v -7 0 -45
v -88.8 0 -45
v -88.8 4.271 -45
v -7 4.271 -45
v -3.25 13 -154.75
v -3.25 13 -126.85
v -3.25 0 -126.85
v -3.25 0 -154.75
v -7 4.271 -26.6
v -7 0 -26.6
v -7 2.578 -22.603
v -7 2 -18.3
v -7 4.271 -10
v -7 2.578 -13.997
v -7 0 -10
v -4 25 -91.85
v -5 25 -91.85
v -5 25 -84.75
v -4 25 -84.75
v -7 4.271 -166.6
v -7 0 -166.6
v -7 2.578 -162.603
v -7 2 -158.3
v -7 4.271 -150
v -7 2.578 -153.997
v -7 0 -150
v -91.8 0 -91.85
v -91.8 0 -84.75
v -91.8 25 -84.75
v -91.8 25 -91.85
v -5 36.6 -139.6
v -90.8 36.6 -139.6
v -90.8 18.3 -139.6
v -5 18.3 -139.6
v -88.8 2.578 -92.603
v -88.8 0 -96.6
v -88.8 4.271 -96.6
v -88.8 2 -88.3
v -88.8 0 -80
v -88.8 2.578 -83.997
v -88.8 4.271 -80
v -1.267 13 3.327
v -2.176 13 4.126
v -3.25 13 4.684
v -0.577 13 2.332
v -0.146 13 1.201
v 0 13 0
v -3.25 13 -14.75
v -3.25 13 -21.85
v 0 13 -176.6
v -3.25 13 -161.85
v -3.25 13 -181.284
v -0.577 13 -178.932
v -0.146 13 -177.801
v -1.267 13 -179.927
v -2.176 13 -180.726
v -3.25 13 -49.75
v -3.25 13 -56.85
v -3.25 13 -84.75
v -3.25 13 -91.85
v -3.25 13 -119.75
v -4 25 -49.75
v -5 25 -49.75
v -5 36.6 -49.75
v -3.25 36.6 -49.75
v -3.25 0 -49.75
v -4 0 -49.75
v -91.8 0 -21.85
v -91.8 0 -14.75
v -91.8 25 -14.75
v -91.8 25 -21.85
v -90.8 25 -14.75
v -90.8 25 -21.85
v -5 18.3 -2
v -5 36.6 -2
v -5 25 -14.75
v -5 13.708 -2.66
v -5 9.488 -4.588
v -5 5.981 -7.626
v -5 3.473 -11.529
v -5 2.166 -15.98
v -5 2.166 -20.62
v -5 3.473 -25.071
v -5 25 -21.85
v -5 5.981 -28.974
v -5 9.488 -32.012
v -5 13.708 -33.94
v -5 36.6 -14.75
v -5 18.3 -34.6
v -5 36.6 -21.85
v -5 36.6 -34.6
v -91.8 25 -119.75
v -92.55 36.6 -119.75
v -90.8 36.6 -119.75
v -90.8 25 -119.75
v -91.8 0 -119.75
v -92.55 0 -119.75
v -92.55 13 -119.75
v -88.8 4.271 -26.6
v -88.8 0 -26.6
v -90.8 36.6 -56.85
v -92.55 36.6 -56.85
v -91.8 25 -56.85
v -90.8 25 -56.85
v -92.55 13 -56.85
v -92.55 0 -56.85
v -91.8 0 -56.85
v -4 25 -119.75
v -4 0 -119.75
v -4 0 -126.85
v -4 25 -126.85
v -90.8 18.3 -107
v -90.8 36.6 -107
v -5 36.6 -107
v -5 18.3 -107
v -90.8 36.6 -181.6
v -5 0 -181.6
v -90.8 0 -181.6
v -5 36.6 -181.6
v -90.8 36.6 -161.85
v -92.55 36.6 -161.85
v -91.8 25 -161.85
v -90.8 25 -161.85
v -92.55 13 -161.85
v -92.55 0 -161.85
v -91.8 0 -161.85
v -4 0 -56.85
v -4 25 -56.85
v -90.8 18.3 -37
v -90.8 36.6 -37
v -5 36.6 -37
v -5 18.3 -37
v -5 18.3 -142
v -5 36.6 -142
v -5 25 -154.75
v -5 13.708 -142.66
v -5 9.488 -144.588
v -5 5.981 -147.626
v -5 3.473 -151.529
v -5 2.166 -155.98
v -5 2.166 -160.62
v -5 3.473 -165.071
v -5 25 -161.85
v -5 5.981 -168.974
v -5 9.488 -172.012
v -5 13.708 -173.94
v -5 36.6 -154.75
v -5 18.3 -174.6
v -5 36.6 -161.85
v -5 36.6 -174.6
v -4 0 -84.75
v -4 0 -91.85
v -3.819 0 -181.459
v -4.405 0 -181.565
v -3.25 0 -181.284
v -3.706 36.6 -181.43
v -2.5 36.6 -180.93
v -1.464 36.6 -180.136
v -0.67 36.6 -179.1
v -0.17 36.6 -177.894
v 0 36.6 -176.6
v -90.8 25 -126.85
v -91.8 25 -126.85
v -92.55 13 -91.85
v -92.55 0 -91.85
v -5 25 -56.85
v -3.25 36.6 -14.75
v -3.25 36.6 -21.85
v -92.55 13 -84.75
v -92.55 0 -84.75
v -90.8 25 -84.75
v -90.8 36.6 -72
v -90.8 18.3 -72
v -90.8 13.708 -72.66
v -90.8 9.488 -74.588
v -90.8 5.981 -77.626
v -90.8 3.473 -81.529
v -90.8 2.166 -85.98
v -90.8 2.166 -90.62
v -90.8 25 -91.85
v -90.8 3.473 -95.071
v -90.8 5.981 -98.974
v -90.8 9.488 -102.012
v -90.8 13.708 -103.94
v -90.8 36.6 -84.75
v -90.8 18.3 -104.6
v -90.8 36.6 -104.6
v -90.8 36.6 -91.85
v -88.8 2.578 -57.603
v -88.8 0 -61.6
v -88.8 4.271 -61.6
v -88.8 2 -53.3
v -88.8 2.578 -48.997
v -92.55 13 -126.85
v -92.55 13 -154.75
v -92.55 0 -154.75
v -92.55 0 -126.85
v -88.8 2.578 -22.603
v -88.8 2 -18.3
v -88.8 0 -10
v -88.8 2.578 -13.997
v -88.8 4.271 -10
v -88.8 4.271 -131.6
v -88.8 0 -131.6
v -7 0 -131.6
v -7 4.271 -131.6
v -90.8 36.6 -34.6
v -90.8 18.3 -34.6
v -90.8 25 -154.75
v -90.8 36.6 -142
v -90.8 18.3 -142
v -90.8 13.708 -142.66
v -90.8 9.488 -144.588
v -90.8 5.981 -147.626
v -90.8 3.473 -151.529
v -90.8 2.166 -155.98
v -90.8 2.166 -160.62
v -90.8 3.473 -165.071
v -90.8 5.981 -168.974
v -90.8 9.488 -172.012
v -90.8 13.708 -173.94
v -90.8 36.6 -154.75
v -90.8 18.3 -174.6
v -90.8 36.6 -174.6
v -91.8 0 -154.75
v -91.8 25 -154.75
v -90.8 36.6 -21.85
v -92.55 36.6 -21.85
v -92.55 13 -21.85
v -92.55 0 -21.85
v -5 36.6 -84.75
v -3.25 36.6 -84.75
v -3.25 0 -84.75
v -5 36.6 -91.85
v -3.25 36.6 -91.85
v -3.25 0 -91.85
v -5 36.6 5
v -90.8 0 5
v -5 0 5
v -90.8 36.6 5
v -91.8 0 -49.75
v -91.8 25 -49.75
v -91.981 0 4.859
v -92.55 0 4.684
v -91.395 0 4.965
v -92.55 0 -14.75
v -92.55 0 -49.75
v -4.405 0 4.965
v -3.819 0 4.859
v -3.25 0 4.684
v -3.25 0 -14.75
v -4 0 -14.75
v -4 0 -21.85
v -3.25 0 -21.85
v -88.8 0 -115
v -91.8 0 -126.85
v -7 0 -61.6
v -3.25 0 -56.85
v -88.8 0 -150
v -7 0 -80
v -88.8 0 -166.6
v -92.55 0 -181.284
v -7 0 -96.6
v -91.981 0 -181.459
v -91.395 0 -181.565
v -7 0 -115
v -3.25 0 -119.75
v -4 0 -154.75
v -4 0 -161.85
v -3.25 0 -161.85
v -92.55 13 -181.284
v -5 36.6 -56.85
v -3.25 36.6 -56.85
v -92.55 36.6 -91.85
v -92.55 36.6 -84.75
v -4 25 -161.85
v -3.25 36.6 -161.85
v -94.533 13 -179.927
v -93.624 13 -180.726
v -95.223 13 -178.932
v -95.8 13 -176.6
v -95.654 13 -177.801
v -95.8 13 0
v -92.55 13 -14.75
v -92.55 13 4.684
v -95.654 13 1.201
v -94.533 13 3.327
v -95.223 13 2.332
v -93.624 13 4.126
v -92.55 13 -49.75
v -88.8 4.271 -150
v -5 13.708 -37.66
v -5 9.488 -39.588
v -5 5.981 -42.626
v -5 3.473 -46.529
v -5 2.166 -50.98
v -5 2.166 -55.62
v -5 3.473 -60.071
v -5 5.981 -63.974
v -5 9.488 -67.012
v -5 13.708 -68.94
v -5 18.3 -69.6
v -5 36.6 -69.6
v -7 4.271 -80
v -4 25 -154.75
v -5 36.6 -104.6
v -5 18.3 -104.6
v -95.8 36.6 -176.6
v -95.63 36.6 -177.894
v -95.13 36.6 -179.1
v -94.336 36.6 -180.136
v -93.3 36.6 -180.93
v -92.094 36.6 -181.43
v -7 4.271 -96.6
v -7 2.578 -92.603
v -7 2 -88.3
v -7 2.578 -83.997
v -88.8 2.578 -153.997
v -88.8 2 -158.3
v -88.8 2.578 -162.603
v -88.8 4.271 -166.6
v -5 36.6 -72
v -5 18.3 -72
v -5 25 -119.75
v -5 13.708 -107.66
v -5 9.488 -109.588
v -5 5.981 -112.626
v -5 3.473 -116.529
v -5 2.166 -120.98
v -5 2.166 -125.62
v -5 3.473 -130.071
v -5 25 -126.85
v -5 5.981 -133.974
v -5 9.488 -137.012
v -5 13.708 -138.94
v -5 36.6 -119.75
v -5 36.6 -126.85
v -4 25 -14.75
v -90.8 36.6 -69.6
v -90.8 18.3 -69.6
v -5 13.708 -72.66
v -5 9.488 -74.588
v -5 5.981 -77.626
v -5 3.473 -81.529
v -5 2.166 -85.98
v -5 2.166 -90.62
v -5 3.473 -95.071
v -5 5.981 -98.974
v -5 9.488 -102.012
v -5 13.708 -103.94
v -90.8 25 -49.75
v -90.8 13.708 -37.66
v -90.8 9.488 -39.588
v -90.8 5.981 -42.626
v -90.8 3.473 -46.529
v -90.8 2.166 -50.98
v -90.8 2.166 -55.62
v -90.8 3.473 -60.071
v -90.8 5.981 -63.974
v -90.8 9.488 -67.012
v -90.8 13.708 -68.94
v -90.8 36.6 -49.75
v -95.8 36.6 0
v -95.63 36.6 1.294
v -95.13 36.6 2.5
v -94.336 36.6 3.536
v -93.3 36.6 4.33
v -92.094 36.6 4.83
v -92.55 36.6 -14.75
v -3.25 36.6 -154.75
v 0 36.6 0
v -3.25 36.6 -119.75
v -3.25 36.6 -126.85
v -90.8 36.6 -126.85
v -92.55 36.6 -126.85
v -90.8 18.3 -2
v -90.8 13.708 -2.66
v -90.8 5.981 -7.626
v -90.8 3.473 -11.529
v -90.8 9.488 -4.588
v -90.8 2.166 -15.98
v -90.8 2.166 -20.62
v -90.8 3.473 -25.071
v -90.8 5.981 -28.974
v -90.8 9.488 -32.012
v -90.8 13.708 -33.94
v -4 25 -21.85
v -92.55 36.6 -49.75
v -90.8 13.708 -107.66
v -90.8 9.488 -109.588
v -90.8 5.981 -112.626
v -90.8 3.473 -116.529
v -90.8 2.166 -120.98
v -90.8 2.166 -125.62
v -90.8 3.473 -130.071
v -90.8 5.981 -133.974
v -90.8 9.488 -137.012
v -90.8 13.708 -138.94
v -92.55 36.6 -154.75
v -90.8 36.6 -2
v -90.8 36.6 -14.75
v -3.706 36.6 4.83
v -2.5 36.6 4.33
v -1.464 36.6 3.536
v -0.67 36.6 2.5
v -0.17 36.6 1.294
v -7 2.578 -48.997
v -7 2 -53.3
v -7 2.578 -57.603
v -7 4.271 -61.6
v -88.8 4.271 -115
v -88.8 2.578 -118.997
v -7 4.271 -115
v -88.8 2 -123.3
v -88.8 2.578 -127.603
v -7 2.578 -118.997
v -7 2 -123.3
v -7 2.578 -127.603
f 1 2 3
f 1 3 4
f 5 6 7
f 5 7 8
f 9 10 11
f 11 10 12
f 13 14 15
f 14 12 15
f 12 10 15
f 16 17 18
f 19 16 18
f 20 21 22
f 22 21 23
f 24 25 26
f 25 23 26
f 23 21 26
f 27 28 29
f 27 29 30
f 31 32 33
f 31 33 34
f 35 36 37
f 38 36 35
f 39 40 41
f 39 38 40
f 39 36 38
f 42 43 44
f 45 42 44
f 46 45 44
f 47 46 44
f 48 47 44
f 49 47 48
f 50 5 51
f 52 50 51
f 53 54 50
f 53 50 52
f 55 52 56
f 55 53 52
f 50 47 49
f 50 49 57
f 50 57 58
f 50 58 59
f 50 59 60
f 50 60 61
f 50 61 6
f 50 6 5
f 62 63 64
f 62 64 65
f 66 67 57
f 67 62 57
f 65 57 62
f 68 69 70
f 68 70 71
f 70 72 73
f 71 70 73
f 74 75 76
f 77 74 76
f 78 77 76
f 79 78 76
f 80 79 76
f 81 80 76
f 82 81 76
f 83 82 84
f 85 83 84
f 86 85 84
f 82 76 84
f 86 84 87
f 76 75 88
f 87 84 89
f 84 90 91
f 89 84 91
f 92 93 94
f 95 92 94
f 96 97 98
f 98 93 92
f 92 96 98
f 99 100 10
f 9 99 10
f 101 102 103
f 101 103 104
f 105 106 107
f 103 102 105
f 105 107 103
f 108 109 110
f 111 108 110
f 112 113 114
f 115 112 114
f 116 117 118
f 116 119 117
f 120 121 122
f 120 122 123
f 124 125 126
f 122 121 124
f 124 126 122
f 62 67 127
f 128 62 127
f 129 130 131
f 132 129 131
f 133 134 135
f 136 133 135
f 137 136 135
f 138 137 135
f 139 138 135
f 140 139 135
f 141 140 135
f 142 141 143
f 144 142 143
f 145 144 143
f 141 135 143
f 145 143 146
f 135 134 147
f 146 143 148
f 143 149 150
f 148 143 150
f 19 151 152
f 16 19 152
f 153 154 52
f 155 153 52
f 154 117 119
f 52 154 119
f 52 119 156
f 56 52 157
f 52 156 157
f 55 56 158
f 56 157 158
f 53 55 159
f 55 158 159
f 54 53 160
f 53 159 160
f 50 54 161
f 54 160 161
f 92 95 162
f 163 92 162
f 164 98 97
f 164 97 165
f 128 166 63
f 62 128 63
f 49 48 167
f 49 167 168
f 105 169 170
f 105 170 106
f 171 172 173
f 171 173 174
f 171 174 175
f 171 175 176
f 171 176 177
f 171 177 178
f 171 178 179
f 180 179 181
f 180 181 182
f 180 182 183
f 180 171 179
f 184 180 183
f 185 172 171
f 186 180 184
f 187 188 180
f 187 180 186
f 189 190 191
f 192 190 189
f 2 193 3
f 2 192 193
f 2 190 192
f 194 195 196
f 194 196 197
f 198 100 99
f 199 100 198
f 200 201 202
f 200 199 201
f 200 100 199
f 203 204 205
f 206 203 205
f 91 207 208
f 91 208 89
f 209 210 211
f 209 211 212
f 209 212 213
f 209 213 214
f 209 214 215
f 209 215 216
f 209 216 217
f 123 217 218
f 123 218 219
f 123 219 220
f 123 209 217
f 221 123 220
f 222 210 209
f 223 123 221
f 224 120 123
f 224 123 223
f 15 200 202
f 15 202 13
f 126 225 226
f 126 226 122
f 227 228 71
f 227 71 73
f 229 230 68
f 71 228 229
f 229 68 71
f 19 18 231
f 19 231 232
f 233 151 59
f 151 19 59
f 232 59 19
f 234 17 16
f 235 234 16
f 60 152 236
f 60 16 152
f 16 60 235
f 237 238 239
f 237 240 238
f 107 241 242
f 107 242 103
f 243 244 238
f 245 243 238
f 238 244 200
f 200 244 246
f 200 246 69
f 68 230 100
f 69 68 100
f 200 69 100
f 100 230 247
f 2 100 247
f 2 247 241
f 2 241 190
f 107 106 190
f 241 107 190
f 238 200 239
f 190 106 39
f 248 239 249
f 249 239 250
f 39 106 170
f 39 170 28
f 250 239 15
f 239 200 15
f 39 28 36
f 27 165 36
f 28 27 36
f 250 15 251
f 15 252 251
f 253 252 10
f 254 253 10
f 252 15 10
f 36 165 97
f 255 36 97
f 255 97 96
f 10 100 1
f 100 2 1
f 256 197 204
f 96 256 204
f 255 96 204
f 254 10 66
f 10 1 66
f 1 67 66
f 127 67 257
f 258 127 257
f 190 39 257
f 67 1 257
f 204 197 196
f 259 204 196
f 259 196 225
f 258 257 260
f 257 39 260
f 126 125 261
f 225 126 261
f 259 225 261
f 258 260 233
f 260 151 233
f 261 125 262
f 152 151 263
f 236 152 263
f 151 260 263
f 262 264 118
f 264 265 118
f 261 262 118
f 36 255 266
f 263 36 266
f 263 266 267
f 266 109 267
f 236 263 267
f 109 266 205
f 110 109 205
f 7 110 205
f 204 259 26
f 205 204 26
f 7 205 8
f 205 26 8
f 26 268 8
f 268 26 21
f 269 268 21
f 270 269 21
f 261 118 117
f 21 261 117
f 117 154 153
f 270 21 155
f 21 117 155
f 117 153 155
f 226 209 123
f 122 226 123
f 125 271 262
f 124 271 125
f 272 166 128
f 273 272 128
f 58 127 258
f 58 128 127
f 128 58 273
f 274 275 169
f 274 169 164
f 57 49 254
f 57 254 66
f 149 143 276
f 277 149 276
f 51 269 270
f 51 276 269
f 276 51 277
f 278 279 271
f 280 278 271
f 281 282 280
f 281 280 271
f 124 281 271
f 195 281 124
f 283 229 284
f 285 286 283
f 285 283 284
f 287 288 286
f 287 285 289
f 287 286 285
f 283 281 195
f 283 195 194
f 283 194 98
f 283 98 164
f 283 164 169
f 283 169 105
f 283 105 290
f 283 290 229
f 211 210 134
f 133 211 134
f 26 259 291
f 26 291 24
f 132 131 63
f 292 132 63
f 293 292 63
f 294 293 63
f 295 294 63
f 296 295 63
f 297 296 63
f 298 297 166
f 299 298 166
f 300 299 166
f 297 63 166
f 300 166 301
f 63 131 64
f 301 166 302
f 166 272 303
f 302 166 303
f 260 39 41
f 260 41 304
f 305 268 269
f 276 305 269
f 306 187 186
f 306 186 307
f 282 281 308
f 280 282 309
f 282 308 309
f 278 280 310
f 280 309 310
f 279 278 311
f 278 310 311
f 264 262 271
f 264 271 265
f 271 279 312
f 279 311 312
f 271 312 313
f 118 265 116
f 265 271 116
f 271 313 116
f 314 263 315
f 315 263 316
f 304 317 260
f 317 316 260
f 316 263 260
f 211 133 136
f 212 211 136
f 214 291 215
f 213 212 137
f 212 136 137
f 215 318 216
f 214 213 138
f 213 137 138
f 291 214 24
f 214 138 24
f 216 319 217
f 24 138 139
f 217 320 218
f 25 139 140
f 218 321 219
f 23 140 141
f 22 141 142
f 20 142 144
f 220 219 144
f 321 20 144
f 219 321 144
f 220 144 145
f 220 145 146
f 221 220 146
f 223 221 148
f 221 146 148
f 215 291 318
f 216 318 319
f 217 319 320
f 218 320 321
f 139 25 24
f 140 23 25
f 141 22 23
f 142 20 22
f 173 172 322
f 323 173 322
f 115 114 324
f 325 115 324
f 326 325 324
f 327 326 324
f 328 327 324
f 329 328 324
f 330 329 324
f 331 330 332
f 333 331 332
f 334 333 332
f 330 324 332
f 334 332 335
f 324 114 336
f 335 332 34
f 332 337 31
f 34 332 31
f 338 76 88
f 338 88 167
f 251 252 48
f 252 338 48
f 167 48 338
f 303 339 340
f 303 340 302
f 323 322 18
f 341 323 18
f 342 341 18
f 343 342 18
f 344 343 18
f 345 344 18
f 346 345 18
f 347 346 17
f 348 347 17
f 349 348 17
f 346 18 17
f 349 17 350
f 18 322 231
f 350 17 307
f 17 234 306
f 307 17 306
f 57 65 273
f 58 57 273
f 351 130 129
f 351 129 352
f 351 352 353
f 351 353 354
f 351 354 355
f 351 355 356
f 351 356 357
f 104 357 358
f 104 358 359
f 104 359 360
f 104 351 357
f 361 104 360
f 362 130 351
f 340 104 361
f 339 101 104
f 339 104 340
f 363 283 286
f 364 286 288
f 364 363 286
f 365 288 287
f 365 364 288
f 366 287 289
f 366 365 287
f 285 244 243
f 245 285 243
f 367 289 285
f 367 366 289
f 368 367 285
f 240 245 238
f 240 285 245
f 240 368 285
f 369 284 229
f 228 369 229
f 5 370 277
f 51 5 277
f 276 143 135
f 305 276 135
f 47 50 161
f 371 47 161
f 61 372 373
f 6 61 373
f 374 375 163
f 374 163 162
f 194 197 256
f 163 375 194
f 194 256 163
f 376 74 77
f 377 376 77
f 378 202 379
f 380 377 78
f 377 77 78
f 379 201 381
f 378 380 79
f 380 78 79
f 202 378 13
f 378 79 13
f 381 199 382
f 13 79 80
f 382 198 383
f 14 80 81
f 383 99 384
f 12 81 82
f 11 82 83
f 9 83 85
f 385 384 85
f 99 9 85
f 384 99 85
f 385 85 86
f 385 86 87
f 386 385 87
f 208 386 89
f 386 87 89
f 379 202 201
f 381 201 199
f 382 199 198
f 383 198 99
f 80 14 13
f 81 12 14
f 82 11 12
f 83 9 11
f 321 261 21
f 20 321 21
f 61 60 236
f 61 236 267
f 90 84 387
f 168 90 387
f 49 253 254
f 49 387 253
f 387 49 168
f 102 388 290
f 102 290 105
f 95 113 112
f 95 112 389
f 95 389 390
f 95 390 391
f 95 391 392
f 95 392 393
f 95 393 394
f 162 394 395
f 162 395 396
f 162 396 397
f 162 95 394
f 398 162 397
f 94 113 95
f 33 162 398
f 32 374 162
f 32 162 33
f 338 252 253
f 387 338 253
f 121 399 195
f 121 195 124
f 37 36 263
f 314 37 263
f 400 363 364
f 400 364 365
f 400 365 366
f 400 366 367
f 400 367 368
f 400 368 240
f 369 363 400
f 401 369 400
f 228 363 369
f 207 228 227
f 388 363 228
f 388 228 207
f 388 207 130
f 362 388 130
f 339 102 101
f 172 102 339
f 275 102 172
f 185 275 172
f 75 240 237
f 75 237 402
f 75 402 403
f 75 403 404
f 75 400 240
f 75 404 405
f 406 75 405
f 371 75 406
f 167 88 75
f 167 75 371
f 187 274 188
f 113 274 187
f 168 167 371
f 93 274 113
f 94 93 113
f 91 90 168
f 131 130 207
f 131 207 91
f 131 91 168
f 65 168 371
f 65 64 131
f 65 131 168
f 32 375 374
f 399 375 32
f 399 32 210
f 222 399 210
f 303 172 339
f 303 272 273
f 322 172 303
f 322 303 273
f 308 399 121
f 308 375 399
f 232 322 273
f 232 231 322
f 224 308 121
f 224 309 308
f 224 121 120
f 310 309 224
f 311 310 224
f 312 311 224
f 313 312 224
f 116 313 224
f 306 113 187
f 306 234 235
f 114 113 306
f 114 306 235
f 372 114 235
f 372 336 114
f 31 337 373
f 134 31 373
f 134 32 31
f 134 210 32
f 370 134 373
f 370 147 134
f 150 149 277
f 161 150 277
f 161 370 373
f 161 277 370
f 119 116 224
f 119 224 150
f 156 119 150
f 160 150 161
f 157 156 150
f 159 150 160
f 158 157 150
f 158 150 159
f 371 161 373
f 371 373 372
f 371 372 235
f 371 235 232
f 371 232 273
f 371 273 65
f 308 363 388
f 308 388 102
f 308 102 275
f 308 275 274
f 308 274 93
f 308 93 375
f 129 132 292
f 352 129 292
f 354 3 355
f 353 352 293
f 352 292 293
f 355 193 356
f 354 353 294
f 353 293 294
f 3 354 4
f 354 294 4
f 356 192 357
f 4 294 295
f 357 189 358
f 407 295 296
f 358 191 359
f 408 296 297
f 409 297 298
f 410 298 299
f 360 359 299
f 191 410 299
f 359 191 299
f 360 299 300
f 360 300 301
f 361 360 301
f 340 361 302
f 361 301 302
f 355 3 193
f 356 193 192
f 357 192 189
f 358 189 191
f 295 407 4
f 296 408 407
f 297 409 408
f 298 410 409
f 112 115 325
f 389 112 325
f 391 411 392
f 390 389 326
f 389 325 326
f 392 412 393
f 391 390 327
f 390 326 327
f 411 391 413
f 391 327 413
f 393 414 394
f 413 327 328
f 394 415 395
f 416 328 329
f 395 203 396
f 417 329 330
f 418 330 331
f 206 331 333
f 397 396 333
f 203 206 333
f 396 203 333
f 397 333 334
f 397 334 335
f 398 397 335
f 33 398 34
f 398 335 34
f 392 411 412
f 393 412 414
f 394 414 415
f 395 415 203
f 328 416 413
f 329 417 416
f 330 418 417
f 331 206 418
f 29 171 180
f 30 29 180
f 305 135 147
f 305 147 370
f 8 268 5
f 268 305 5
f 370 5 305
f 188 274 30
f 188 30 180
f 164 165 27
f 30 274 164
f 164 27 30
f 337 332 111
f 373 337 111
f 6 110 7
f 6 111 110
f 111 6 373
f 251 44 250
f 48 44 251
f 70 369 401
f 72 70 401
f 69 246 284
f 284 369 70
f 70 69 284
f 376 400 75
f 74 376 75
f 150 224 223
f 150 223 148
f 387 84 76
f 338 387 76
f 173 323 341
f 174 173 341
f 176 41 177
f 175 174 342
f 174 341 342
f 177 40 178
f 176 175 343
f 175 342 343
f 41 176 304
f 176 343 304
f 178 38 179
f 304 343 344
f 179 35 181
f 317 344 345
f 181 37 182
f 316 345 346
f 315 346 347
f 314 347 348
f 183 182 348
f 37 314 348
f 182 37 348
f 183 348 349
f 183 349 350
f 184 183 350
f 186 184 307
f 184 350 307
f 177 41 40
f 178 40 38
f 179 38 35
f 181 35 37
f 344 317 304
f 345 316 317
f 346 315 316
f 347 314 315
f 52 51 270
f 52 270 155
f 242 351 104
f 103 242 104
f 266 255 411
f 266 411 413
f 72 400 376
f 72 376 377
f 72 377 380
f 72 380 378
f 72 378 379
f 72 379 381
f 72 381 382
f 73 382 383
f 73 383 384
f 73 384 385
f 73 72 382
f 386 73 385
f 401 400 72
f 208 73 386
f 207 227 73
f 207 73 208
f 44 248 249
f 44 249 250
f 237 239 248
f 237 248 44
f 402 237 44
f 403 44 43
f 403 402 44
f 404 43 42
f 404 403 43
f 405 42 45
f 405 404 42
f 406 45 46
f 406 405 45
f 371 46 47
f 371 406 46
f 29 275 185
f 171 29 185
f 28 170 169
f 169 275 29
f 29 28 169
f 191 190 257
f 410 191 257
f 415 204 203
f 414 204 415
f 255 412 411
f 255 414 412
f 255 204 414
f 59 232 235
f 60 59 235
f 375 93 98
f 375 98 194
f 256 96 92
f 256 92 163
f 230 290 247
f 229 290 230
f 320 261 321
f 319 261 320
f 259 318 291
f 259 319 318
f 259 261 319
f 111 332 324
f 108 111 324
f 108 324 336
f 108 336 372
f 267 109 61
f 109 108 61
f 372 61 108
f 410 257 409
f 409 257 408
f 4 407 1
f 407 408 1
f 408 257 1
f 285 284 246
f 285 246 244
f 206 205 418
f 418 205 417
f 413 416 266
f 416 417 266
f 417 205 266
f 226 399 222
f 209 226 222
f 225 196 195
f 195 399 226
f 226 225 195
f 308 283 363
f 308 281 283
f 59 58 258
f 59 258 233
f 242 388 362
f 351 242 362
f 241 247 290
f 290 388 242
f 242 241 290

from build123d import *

# Parameters (mm, degrees)
SKETCH_241_W                = 95.8
SKETCH_241_H                = 36.6
EXTRUDE_326_DEPTH           = 36.6
CUT_EXTRUDE_START           = -5
SKETCH_380_R                = 16.3
CUT_EXTRUDE_539_DEPTH       = 85.8
SKETCH_588_W                = 85.8
SKETCH_588_H                = 32.6
CUT_EXTRUDE_850_DEPTH       = 18.3
CUT_EXTRUDE_1245_DEPTH      = 109.888750567
CUT_EXTRUDE_1245_DEPTH_BACK = 109.888750567
SKETCH_902_W                = 0.75
SKETCH_902_H                = 7.1
SKETCH_A_W                  = 7.1
SKETCH_A_H                  = 11.6
CUT_EXTRUDE_A_DEPTH         = 1
SKETCH_B_W                  = 7.1
SKETCH_B_H                  = 11.6
CUT_EXTRUDE_B_DEPTH         = 1
SKETCH_1779_W               = 81.8
SKETCH_1779_H               = 16.6
CUT_EXTRUDE_2059_DEPTH      = 109.888750567
SKETCH_2105_W               = 3.25
SKETCH_2105_H               = 13.1
CUT_EXTRUDE_2527_DEPTH      = 13
PATTERN_LINEAR_2584_COUNT   = 5
PATTERN_LINEAR_2584_PITCH   = 35
SKETCH_2694_W               = 95.8
SKETCH_2694_H               = 36.6
EXTRUDE_2884_DEPTH          = 5
SKETCH_2964_W               = 95.8
SKETCH_2964_H               = 36.6
EXTRUDE_3079_DEPTH          = 5
FILLET_1_R                  = 5
FILLET_2_R                  = 5
FILLET_3_R                  = 5
FILLET_4_R                  = 5
SKETCH_3561_W               = 186.6
SKETCH_3561_H               = 13
CUT_EXTRUDE_3822_DEPTH      = 3.25
SKETCH_4173_W               = 186.6
SKETCH_4173_H               = 13
CUT_EXTRUDE_4352_DEPTH      = 3.25


with BuildPart() as part:
    # Sketch 241 → Extrude 326 (new body)
    with BuildSketch(Plane(origin=(0, 0, 0), x_dir=(1, 0, 0), z_dir=(0, 1, 0))):
        with Locations((-47.9, 18.3)):
            Rectangle(SKETCH_241_W, SKETCH_241_H)
    extrude(amount=EXTRUDE_326_DEPTH)

    # Sketch 380 → Cut-Extrude 539 (cut)
    with BuildSketch(Plane(origin=(0, 0, 0), x_dir=(0, 0, -1), z_dir=(1, 0, 0)).offset(CUT_EXTRUDE_START)):
        with Locations((18.3, 18.3)):
            Circle(SKETCH_380_R)
    extrude(amount=-CUT_EXTRUDE_539_DEPTH, mode=Mode.SUBTRACT)

    # Sketch 588 → Cut-Extrude 850 (cut)
    with BuildSketch(Plane(origin=(0, 36.6, 0), x_dir=(1, 0, 0), z_dir=(0, 1, 0))):
        with Locations((-47.9, 18.3)):
            Rectangle(SKETCH_588_W, SKETCH_588_H)
    extrude(amount=-CUT_EXTRUDE_850_DEPTH, mode=Mode.SUBTRACT)

    # Sketch 902 → Cut-Extrude 1245 (cut, two sides: drawn at the far end of the back side and taken through both)
    with BuildSketch(Plane(origin=(0, 36.6, 0), x_dir=(1, 0, 0), z_dir=(0, 1, 0)).offset(-CUT_EXTRUDE_1245_DEPTH_BACK)):
        with Locations((-92.175, 18.3)):
            Rectangle(SKETCH_902_W, SKETCH_902_H)
        with Locations((-3.625, 18.3)):
            Rectangle(SKETCH_902_W, SKETCH_902_H)
    extrude(amount=CUT_EXTRUDE_1245_DEPTH + CUT_EXTRUDE_1245_DEPTH_BACK, mode=Mode.SUBTRACT)

    # 触点开窗面A → 触点开窗A (cut)
    with BuildSketch(Plane(origin=(-90.8, 0, 0), x_dir=(0, 0, -1), z_dir=(1, 0, 0))):
        with Locations((18.3, 30.8)):
            Rectangle(SKETCH_A_W, SKETCH_A_H)
    extrude(amount=-CUT_EXTRUDE_A_DEPTH, mode=Mode.SUBTRACT)

    # 触点开窗面B → 触点开窗B (cut)
    with BuildSketch(Plane.ZY.offset(5)):
        with Locations((-18.3, 30.8)):
            Rectangle(SKETCH_B_W, SKETCH_B_H)
    extrude(amount=-CUT_EXTRUDE_B_DEPTH, mode=Mode.SUBTRACT)

    # Sketch 1779 → Cut-Extrude 2059 (cut, through all)
    with BuildSketch(Plane.XZ):
        with Locations((-47.9, -18.3)):
            Rectangle(SKETCH_1779_W, SKETCH_1779_H)
    extrude(amount=-CUT_EXTRUDE_2059_DEPTH, mode=Mode.SUBTRACT)

    # Sketch 2105 → Cut-Extrude 2527 (cut)
    with BuildSketch(Plane.XZ):
        with Locations((-94.175, -18.3)):
            Rectangle(SKETCH_2105_W, SKETCH_2105_H)
        with Locations((-1.625, -18.3)):
            Rectangle(SKETCH_2105_W, SKETCH_2105_H)
    extrude(amount=-CUT_EXTRUDE_2527_DEPTH, mode=Mode.SUBTRACT)


with BuildPart() as pattern_linear_2584_1:
    # Pattern Linear 2584: pattern copy
    add(part.part.moved(Location(Vector(0, 0, -1) * (1 * PATTERN_LINEAR_2584_PITCH))))


with BuildPart() as pattern_linear_2584_2:
    # Pattern Linear 2584: pattern copy
    add(part.part.moved(Location(Vector(0, 0, -1) * (2 * PATTERN_LINEAR_2584_PITCH))))


with BuildPart() as pattern_linear_2584_3:
    # Pattern Linear 2584: pattern copy
    add(part.part.moved(Location(Vector(0, 0, -1) * (3 * PATTERN_LINEAR_2584_PITCH))))


with BuildPart() as pattern_linear_2584_4:
    # Pattern Linear 2584: pattern copy
    add(part.part.moved(Location(Vector(0, 0, -1) * (4 * PATTERN_LINEAR_2584_PITCH))))

    # Sketch 2694 → Extrude 2884 (add)
    with BuildSketch(Plane(origin=(0, 0, -176.6), x_dir=(-1, 0, 0), z_dir=(0, 0, -1))):
        with Locations((47.9, 18.3)):
            Rectangle(SKETCH_2694_W, SKETCH_2694_H)
    extrude(amount=EXTRUDE_2884_DEPTH)

    # 圆角3
    fillet_3_edges = [pattern_linear_2584_4.edges().sort_by_distance(p)[0] for p in [
        (-95.8, 18.3, -181.6),
    ]]
    fillet(fillet_3_edges, radius=FILLET_3_R)

    # 圆角4
    fillet_4_edges = [pattern_linear_2584_4.edges().sort_by_distance(p)[0] for p in [
        (0, 18.3, -181.6),
    ]]
    fillet(fillet_4_edges, radius=FILLET_4_R)


with BuildPart() as part_1:
    add(part.part)

    # Sketch 2964 → Extrude 3079 (add)
    with BuildSketch(Plane.XY):
        with Locations((-47.9, 18.3)):
            Rectangle(SKETCH_2964_W, SKETCH_2964_H)
    extrude(amount=EXTRUDE_3079_DEPTH)

    # 圆角1
    fillet_1_edges = [part_1.edges().sort_by_distance(p)[0] for p in [
        (-95.8, 18.3, 5),
    ]]
    fillet(fillet_1_edges, radius=FILLET_1_R)

    # 圆角2
    fillet_2_edges = [part_1.edges().sort_by_distance(p)[0] for p in [
        (0, 18.3, 5),
    ]]
    fillet(fillet_2_edges, radius=FILLET_2_R)


with BuildPart() as cut_extrude_3822_tool:
    # Sketch 3561 → Cut-Extrude 3822 (new body)
    with BuildSketch(Plane.ZY.offset(95.8)):
        with Locations((-88.3, 6.5)):
            Rectangle(SKETCH_3561_W, SKETCH_3561_H)
    extrude(amount=-CUT_EXTRUDE_3822_DEPTH)


with BuildPart() as part_2:
    add(part_1.part)

    # Cut-Extrude 3822: cut by cut_extrude_3822_tool
    add(cut_extrude_3822_tool.part, mode=Mode.SUBTRACT)


with BuildPart() as pattern_linear_2584_1_1:
    add(pattern_linear_2584_1.part)

    # Cut-Extrude 3822: cut by cut_extrude_3822_tool
    add(cut_extrude_3822_tool.part, mode=Mode.SUBTRACT)


with BuildPart() as pattern_linear_2584_2_1:
    add(pattern_linear_2584_2.part)

    # Cut-Extrude 3822: cut by cut_extrude_3822_tool
    add(cut_extrude_3822_tool.part, mode=Mode.SUBTRACT)


with BuildPart() as pattern_linear_2584_3_1:
    add(pattern_linear_2584_3.part)

    # Cut-Extrude 3822: cut by cut_extrude_3822_tool
    add(cut_extrude_3822_tool.part, mode=Mode.SUBTRACT)


with BuildPart() as pattern_linear_2584_4_1:
    add(pattern_linear_2584_4.part)

    # Cut-Extrude 3822: cut by cut_extrude_3822_tool
    add(cut_extrude_3822_tool.part, mode=Mode.SUBTRACT)


with BuildPart() as cut_extrude_4352_tool:
    # Sketch 4173 → Cut-Extrude 4352 (new body)
    with BuildSketch(Plane(origin=(0, 0, 0), x_dir=(0, 0, -1), z_dir=(1, 0, 0))):
        with Locations((88.3, 6.5)):
            Rectangle(SKETCH_4173_W, SKETCH_4173_H)
    extrude(amount=-CUT_EXTRUDE_4352_DEPTH)


with BuildPart() as part_3:
    add(part_2.part)

    # Cut-Extrude 4352: cut by cut_extrude_4352_tool
    add(cut_extrude_4352_tool.part, mode=Mode.SUBTRACT)


with BuildPart() as pattern_linear_2584_1_2:
    add(pattern_linear_2584_1_1.part)

    # Cut-Extrude 4352: cut by cut_extrude_4352_tool
    add(cut_extrude_4352_tool.part, mode=Mode.SUBTRACT)


with BuildPart() as pattern_linear_2584_2_2:
    add(pattern_linear_2584_2_1.part)

    # Cut-Extrude 4352: cut by cut_extrude_4352_tool
    add(cut_extrude_4352_tool.part, mode=Mode.SUBTRACT)


with BuildPart() as pattern_linear_2584_3_2:
    add(pattern_linear_2584_3_1.part)

    # Cut-Extrude 4352: cut by cut_extrude_4352_tool
    add(cut_extrude_4352_tool.part, mode=Mode.SUBTRACT)


with BuildPart() as pattern_linear_2584_4_2:
    add(pattern_linear_2584_4_1.part)

    # Cut-Extrude 4352: cut by cut_extrude_4352_tool
    add(cut_extrude_4352_tool.part, mode=Mode.SUBTRACT)


with BuildPart() as pattern_linear_2584_1_3:
    add(pattern_linear_2584_1_2.part)

    # Combine 5S: union Pattern Linear 2584_2, Pattern Linear 2584_3, Pattern Linear 2584_4, part
    add(pattern_linear_2584_2_2.part)
    add(pattern_linear_2584_3_2.part)
    add(pattern_linear_2584_4_2.part)
    add(part_3.part)


solid = pattern_linear_2584_1_3.part
